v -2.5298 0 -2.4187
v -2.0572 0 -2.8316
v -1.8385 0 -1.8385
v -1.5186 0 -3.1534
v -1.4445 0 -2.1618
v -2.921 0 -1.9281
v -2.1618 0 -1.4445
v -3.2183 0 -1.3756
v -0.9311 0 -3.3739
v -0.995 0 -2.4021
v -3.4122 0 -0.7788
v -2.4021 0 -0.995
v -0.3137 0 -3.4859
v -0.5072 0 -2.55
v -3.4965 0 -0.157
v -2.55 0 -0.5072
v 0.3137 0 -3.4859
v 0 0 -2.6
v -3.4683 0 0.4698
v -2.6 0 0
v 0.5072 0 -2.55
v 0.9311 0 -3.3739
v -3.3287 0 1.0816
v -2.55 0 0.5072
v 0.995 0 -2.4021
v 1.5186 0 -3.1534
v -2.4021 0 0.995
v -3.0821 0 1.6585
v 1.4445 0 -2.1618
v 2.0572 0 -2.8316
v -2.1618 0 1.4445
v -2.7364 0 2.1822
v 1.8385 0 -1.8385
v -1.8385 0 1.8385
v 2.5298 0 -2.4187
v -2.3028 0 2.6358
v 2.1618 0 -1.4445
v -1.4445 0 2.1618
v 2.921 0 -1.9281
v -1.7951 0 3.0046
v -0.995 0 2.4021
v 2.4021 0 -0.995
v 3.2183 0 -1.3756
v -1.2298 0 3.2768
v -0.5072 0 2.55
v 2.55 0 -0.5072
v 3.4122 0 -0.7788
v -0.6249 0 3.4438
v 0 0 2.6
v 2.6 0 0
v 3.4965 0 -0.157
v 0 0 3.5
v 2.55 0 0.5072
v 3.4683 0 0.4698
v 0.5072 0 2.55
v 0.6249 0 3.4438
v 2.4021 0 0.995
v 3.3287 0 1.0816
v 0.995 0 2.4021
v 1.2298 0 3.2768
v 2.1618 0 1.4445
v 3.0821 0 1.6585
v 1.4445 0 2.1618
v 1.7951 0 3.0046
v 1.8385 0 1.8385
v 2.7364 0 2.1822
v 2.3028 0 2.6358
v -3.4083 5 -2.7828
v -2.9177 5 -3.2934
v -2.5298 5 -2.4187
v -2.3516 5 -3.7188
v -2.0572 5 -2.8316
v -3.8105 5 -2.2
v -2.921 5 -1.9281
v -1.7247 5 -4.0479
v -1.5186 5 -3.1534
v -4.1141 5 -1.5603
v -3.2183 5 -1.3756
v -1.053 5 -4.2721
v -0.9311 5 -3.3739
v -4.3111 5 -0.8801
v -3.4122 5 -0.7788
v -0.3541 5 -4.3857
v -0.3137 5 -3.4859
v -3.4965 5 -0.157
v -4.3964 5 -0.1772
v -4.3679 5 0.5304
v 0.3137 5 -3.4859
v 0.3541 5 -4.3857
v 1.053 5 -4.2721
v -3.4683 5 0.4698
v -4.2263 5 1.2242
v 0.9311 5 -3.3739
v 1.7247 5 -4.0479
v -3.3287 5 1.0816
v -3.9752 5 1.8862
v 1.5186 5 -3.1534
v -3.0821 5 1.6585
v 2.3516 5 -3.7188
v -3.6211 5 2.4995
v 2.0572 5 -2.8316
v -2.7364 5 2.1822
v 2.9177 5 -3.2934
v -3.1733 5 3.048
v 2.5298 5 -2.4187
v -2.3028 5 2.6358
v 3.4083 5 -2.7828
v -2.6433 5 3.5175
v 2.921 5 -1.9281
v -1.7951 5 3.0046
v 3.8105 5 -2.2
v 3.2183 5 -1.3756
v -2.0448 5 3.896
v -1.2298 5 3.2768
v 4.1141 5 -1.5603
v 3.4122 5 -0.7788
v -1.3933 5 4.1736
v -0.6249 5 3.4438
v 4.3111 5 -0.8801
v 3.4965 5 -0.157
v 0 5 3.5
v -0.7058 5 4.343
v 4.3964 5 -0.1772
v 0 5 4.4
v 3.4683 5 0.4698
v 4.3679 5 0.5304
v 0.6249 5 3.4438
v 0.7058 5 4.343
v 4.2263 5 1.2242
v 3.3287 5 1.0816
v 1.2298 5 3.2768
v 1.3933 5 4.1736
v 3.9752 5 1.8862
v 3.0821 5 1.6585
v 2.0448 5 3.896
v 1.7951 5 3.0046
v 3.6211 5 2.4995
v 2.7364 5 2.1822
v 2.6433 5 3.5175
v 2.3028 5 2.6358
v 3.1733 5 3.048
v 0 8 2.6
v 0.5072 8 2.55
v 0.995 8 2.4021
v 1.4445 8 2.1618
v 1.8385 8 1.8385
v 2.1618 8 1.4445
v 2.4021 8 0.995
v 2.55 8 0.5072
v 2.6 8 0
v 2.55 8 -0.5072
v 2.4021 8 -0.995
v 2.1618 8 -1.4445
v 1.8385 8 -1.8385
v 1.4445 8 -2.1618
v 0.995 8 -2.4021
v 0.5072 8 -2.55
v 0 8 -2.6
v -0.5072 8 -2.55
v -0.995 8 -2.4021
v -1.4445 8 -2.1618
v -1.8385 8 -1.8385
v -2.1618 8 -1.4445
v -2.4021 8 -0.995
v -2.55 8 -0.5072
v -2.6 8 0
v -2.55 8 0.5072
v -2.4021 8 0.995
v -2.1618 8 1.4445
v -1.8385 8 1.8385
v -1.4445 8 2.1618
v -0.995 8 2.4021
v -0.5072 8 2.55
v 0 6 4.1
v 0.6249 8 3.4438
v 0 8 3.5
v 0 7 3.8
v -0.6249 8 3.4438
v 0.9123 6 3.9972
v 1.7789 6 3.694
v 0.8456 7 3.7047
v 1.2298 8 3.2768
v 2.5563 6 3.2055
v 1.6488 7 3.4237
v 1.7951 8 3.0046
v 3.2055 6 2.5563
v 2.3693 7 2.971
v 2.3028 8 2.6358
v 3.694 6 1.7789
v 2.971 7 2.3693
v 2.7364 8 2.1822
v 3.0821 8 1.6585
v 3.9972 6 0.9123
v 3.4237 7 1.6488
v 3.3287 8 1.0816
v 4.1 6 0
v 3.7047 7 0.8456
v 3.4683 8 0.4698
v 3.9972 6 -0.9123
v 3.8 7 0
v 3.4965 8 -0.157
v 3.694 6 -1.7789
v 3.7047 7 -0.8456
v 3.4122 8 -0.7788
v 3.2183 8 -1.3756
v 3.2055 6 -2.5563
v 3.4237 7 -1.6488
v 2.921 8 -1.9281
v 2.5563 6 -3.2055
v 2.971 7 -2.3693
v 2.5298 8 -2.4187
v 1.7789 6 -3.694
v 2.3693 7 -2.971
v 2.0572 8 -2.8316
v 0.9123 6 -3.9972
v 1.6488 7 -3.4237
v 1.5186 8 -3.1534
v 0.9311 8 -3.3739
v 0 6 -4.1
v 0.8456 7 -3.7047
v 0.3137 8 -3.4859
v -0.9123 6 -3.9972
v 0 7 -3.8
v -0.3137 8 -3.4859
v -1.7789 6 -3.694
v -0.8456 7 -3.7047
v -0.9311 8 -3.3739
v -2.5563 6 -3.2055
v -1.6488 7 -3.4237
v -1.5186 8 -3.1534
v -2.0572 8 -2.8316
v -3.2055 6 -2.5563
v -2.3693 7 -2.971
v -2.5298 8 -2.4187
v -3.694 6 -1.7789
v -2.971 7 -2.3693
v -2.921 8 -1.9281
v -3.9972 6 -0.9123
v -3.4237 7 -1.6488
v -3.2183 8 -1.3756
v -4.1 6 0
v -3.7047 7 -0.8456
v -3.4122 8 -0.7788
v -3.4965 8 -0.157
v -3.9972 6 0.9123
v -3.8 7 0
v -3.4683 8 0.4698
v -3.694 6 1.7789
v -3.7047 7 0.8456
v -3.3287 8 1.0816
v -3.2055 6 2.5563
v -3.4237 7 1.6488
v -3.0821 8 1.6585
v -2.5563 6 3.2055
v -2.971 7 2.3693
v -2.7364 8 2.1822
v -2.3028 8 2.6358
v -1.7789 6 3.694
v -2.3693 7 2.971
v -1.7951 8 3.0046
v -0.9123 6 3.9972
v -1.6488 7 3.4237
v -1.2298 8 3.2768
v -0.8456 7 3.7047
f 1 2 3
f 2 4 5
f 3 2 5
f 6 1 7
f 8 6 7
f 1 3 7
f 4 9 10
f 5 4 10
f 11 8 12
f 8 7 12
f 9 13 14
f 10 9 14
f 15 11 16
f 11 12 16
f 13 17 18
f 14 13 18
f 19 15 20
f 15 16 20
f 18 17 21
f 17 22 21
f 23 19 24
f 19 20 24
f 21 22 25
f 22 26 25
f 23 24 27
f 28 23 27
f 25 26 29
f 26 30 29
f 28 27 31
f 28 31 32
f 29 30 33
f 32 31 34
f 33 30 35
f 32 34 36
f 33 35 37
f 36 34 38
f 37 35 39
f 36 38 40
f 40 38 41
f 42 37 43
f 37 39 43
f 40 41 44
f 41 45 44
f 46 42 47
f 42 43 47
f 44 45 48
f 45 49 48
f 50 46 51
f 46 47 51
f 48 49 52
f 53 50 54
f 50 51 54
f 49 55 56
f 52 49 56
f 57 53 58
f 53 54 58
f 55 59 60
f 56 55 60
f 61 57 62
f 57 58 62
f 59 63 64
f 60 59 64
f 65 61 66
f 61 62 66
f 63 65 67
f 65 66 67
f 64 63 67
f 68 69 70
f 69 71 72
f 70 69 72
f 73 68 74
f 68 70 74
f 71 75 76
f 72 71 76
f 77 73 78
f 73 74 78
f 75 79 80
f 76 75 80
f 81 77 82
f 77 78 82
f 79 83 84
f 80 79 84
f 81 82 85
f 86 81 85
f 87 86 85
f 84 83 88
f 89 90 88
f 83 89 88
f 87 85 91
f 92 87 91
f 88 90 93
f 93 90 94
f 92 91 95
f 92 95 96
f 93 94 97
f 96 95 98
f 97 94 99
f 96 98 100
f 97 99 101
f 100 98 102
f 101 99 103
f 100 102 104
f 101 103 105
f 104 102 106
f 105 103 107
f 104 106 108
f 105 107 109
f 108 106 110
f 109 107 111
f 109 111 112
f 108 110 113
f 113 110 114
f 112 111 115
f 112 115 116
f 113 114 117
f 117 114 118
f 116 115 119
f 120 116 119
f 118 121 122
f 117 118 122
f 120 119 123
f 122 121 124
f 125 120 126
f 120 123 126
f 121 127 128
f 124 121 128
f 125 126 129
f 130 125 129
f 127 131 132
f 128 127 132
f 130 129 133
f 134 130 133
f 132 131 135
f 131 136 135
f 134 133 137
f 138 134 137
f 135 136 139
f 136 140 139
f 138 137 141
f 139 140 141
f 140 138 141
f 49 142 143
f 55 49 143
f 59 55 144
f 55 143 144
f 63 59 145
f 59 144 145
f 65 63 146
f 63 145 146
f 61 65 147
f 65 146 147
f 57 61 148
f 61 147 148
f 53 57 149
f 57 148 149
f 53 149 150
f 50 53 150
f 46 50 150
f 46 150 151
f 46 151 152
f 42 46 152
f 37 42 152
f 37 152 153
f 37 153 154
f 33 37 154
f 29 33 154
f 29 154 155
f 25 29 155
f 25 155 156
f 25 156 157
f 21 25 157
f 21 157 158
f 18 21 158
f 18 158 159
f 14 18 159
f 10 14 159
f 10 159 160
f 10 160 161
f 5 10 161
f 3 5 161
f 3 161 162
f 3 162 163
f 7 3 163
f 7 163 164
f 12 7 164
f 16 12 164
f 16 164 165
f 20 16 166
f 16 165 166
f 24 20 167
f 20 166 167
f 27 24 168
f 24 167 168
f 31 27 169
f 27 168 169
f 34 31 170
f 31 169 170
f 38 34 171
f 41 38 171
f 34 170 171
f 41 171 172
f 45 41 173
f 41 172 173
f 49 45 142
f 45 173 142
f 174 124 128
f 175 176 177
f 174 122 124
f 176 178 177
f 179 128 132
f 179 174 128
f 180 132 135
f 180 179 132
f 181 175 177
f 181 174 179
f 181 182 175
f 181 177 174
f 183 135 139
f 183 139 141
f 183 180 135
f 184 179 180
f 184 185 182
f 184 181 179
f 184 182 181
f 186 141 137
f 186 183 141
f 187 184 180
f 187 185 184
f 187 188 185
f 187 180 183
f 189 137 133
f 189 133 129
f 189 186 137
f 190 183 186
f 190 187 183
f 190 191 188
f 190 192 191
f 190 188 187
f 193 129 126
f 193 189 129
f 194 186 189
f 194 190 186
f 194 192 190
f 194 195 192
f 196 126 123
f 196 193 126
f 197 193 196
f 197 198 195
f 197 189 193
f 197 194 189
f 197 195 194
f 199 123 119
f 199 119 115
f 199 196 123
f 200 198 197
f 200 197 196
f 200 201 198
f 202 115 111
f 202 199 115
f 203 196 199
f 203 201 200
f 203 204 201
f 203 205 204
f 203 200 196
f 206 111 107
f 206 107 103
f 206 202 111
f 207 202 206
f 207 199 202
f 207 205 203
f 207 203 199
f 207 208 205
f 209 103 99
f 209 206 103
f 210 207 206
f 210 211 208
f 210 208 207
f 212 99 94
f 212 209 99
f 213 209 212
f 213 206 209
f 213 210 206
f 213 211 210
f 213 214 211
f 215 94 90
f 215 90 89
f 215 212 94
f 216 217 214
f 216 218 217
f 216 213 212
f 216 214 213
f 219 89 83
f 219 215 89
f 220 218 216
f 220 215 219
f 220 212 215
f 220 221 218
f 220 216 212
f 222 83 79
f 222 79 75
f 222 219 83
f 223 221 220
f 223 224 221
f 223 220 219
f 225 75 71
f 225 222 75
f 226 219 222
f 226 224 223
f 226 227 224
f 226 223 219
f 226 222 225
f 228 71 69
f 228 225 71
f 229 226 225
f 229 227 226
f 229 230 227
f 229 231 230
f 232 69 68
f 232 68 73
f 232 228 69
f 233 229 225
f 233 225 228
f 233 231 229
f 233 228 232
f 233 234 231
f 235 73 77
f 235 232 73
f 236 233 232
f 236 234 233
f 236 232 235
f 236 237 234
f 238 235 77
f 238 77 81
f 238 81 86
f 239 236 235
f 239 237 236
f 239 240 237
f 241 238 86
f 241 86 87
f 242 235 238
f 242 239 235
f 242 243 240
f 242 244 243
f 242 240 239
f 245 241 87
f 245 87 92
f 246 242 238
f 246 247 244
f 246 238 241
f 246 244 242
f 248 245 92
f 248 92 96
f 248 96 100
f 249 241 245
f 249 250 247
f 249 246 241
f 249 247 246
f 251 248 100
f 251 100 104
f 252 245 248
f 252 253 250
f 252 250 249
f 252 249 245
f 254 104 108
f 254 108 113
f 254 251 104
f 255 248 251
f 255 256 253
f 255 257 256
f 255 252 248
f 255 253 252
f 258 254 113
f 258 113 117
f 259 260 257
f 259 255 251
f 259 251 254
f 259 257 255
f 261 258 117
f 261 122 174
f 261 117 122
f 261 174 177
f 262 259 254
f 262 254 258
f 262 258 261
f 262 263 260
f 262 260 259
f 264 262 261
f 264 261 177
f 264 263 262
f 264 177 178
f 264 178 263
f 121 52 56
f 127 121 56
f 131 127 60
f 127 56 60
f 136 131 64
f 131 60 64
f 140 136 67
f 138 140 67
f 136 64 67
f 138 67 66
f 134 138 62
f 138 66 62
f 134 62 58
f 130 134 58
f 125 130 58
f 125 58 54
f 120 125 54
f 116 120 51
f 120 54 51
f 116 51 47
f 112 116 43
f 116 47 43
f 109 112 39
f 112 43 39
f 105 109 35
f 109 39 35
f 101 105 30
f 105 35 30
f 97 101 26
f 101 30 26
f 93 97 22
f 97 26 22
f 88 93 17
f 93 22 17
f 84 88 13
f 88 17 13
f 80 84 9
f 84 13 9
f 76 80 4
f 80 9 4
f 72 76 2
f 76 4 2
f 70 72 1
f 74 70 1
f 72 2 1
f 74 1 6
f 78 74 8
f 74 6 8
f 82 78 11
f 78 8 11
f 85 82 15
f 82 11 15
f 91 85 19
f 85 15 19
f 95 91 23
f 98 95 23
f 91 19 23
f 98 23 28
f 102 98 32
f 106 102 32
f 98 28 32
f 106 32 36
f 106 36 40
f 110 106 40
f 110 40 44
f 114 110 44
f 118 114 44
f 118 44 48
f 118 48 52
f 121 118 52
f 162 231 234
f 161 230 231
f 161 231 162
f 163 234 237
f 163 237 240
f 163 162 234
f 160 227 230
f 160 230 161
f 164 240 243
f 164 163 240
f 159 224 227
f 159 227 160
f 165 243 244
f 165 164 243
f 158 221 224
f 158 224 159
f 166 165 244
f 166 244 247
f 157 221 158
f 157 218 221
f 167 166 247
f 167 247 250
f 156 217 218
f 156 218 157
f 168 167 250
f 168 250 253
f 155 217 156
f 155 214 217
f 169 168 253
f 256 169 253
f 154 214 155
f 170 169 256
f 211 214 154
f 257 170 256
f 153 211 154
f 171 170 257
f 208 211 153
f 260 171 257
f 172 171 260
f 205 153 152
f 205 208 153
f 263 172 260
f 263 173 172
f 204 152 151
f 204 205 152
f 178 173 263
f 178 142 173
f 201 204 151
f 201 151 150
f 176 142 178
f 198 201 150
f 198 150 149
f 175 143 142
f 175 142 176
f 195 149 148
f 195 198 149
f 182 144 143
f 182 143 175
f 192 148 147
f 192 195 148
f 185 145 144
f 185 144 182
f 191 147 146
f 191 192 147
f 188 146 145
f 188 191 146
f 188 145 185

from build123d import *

# Parameters (mm, degrees)
SKETCH1_R           = 3.5
BOSS_EXTRUDE1_DEPTH = 5
SKETCH2_R           = 5
BOSS_EXTRUDE2_DEPTH = 3
CHAMFER1_SIZE       = 5
CHAMFER1_SIZE_2     = 1.5
SKETCH3_R           = 2.6
CUT_EXTRUDE1_DEPTH  = 20


with BuildPart() as part:
    # Sketch1 → Boss-Extrude1 (new body)
    with BuildSketch(Plane(origin=(0, 0, 0), x_dir=(1, 0, 0), z_dir=(0, 1, 0))):
        with Locations(Location((0, 0, 0), (0, 0, 270))):
            Circle(SKETCH1_R)
    extrude(amount=BOSS_EXTRUDE1_DEPTH)

    # Sketch2 → Boss-Extrude2 (add)
    with BuildSketch(Plane(origin=(0, 5, 0), x_dir=(1, 0, 0), z_dir=(0, 1, 0))):
        with Locations(Location((0, 0, 0), (0, 0, 270))):
            Circle(SKETCH2_R)
    extrude(amount=BOSS_EXTRUDE2_DEPTH)

    # Chamfer1
    # the kernel refuses this chamfer: 5, 1.5 mm, written as the material it takes off along each edge
    with BuildSketch(Plane(origin=(0, 8, 0), x_dir=(0, 0, 1), z_dir=(-1, 0, 0))) as chamfer1_piece_1:
        Polygon((5, -CHAMFER1_SIZE), (5 - CHAMFER1_SIZE_2, 0), (5, 0), align=None)
    revolve(axis=Axis((0, 8, 0), (0, 1, 0)), mode=Mode.SUBTRACT)

    # Sketch3 → Cut-Extrude1 (cut)
    with BuildSketch(Plane(origin=(0, 8, 0), x_dir=(1, 0, 0), z_dir=(0, 1, 0))):
        with Locations(Location((0, 0, 0), (0, 0, 270))):
            Circle(SKETCH3_R)
    extrude(amount=-CUT_EXTRUDE1_DEPTH, mode=Mode.SUBTRACT)


solid = part.part
